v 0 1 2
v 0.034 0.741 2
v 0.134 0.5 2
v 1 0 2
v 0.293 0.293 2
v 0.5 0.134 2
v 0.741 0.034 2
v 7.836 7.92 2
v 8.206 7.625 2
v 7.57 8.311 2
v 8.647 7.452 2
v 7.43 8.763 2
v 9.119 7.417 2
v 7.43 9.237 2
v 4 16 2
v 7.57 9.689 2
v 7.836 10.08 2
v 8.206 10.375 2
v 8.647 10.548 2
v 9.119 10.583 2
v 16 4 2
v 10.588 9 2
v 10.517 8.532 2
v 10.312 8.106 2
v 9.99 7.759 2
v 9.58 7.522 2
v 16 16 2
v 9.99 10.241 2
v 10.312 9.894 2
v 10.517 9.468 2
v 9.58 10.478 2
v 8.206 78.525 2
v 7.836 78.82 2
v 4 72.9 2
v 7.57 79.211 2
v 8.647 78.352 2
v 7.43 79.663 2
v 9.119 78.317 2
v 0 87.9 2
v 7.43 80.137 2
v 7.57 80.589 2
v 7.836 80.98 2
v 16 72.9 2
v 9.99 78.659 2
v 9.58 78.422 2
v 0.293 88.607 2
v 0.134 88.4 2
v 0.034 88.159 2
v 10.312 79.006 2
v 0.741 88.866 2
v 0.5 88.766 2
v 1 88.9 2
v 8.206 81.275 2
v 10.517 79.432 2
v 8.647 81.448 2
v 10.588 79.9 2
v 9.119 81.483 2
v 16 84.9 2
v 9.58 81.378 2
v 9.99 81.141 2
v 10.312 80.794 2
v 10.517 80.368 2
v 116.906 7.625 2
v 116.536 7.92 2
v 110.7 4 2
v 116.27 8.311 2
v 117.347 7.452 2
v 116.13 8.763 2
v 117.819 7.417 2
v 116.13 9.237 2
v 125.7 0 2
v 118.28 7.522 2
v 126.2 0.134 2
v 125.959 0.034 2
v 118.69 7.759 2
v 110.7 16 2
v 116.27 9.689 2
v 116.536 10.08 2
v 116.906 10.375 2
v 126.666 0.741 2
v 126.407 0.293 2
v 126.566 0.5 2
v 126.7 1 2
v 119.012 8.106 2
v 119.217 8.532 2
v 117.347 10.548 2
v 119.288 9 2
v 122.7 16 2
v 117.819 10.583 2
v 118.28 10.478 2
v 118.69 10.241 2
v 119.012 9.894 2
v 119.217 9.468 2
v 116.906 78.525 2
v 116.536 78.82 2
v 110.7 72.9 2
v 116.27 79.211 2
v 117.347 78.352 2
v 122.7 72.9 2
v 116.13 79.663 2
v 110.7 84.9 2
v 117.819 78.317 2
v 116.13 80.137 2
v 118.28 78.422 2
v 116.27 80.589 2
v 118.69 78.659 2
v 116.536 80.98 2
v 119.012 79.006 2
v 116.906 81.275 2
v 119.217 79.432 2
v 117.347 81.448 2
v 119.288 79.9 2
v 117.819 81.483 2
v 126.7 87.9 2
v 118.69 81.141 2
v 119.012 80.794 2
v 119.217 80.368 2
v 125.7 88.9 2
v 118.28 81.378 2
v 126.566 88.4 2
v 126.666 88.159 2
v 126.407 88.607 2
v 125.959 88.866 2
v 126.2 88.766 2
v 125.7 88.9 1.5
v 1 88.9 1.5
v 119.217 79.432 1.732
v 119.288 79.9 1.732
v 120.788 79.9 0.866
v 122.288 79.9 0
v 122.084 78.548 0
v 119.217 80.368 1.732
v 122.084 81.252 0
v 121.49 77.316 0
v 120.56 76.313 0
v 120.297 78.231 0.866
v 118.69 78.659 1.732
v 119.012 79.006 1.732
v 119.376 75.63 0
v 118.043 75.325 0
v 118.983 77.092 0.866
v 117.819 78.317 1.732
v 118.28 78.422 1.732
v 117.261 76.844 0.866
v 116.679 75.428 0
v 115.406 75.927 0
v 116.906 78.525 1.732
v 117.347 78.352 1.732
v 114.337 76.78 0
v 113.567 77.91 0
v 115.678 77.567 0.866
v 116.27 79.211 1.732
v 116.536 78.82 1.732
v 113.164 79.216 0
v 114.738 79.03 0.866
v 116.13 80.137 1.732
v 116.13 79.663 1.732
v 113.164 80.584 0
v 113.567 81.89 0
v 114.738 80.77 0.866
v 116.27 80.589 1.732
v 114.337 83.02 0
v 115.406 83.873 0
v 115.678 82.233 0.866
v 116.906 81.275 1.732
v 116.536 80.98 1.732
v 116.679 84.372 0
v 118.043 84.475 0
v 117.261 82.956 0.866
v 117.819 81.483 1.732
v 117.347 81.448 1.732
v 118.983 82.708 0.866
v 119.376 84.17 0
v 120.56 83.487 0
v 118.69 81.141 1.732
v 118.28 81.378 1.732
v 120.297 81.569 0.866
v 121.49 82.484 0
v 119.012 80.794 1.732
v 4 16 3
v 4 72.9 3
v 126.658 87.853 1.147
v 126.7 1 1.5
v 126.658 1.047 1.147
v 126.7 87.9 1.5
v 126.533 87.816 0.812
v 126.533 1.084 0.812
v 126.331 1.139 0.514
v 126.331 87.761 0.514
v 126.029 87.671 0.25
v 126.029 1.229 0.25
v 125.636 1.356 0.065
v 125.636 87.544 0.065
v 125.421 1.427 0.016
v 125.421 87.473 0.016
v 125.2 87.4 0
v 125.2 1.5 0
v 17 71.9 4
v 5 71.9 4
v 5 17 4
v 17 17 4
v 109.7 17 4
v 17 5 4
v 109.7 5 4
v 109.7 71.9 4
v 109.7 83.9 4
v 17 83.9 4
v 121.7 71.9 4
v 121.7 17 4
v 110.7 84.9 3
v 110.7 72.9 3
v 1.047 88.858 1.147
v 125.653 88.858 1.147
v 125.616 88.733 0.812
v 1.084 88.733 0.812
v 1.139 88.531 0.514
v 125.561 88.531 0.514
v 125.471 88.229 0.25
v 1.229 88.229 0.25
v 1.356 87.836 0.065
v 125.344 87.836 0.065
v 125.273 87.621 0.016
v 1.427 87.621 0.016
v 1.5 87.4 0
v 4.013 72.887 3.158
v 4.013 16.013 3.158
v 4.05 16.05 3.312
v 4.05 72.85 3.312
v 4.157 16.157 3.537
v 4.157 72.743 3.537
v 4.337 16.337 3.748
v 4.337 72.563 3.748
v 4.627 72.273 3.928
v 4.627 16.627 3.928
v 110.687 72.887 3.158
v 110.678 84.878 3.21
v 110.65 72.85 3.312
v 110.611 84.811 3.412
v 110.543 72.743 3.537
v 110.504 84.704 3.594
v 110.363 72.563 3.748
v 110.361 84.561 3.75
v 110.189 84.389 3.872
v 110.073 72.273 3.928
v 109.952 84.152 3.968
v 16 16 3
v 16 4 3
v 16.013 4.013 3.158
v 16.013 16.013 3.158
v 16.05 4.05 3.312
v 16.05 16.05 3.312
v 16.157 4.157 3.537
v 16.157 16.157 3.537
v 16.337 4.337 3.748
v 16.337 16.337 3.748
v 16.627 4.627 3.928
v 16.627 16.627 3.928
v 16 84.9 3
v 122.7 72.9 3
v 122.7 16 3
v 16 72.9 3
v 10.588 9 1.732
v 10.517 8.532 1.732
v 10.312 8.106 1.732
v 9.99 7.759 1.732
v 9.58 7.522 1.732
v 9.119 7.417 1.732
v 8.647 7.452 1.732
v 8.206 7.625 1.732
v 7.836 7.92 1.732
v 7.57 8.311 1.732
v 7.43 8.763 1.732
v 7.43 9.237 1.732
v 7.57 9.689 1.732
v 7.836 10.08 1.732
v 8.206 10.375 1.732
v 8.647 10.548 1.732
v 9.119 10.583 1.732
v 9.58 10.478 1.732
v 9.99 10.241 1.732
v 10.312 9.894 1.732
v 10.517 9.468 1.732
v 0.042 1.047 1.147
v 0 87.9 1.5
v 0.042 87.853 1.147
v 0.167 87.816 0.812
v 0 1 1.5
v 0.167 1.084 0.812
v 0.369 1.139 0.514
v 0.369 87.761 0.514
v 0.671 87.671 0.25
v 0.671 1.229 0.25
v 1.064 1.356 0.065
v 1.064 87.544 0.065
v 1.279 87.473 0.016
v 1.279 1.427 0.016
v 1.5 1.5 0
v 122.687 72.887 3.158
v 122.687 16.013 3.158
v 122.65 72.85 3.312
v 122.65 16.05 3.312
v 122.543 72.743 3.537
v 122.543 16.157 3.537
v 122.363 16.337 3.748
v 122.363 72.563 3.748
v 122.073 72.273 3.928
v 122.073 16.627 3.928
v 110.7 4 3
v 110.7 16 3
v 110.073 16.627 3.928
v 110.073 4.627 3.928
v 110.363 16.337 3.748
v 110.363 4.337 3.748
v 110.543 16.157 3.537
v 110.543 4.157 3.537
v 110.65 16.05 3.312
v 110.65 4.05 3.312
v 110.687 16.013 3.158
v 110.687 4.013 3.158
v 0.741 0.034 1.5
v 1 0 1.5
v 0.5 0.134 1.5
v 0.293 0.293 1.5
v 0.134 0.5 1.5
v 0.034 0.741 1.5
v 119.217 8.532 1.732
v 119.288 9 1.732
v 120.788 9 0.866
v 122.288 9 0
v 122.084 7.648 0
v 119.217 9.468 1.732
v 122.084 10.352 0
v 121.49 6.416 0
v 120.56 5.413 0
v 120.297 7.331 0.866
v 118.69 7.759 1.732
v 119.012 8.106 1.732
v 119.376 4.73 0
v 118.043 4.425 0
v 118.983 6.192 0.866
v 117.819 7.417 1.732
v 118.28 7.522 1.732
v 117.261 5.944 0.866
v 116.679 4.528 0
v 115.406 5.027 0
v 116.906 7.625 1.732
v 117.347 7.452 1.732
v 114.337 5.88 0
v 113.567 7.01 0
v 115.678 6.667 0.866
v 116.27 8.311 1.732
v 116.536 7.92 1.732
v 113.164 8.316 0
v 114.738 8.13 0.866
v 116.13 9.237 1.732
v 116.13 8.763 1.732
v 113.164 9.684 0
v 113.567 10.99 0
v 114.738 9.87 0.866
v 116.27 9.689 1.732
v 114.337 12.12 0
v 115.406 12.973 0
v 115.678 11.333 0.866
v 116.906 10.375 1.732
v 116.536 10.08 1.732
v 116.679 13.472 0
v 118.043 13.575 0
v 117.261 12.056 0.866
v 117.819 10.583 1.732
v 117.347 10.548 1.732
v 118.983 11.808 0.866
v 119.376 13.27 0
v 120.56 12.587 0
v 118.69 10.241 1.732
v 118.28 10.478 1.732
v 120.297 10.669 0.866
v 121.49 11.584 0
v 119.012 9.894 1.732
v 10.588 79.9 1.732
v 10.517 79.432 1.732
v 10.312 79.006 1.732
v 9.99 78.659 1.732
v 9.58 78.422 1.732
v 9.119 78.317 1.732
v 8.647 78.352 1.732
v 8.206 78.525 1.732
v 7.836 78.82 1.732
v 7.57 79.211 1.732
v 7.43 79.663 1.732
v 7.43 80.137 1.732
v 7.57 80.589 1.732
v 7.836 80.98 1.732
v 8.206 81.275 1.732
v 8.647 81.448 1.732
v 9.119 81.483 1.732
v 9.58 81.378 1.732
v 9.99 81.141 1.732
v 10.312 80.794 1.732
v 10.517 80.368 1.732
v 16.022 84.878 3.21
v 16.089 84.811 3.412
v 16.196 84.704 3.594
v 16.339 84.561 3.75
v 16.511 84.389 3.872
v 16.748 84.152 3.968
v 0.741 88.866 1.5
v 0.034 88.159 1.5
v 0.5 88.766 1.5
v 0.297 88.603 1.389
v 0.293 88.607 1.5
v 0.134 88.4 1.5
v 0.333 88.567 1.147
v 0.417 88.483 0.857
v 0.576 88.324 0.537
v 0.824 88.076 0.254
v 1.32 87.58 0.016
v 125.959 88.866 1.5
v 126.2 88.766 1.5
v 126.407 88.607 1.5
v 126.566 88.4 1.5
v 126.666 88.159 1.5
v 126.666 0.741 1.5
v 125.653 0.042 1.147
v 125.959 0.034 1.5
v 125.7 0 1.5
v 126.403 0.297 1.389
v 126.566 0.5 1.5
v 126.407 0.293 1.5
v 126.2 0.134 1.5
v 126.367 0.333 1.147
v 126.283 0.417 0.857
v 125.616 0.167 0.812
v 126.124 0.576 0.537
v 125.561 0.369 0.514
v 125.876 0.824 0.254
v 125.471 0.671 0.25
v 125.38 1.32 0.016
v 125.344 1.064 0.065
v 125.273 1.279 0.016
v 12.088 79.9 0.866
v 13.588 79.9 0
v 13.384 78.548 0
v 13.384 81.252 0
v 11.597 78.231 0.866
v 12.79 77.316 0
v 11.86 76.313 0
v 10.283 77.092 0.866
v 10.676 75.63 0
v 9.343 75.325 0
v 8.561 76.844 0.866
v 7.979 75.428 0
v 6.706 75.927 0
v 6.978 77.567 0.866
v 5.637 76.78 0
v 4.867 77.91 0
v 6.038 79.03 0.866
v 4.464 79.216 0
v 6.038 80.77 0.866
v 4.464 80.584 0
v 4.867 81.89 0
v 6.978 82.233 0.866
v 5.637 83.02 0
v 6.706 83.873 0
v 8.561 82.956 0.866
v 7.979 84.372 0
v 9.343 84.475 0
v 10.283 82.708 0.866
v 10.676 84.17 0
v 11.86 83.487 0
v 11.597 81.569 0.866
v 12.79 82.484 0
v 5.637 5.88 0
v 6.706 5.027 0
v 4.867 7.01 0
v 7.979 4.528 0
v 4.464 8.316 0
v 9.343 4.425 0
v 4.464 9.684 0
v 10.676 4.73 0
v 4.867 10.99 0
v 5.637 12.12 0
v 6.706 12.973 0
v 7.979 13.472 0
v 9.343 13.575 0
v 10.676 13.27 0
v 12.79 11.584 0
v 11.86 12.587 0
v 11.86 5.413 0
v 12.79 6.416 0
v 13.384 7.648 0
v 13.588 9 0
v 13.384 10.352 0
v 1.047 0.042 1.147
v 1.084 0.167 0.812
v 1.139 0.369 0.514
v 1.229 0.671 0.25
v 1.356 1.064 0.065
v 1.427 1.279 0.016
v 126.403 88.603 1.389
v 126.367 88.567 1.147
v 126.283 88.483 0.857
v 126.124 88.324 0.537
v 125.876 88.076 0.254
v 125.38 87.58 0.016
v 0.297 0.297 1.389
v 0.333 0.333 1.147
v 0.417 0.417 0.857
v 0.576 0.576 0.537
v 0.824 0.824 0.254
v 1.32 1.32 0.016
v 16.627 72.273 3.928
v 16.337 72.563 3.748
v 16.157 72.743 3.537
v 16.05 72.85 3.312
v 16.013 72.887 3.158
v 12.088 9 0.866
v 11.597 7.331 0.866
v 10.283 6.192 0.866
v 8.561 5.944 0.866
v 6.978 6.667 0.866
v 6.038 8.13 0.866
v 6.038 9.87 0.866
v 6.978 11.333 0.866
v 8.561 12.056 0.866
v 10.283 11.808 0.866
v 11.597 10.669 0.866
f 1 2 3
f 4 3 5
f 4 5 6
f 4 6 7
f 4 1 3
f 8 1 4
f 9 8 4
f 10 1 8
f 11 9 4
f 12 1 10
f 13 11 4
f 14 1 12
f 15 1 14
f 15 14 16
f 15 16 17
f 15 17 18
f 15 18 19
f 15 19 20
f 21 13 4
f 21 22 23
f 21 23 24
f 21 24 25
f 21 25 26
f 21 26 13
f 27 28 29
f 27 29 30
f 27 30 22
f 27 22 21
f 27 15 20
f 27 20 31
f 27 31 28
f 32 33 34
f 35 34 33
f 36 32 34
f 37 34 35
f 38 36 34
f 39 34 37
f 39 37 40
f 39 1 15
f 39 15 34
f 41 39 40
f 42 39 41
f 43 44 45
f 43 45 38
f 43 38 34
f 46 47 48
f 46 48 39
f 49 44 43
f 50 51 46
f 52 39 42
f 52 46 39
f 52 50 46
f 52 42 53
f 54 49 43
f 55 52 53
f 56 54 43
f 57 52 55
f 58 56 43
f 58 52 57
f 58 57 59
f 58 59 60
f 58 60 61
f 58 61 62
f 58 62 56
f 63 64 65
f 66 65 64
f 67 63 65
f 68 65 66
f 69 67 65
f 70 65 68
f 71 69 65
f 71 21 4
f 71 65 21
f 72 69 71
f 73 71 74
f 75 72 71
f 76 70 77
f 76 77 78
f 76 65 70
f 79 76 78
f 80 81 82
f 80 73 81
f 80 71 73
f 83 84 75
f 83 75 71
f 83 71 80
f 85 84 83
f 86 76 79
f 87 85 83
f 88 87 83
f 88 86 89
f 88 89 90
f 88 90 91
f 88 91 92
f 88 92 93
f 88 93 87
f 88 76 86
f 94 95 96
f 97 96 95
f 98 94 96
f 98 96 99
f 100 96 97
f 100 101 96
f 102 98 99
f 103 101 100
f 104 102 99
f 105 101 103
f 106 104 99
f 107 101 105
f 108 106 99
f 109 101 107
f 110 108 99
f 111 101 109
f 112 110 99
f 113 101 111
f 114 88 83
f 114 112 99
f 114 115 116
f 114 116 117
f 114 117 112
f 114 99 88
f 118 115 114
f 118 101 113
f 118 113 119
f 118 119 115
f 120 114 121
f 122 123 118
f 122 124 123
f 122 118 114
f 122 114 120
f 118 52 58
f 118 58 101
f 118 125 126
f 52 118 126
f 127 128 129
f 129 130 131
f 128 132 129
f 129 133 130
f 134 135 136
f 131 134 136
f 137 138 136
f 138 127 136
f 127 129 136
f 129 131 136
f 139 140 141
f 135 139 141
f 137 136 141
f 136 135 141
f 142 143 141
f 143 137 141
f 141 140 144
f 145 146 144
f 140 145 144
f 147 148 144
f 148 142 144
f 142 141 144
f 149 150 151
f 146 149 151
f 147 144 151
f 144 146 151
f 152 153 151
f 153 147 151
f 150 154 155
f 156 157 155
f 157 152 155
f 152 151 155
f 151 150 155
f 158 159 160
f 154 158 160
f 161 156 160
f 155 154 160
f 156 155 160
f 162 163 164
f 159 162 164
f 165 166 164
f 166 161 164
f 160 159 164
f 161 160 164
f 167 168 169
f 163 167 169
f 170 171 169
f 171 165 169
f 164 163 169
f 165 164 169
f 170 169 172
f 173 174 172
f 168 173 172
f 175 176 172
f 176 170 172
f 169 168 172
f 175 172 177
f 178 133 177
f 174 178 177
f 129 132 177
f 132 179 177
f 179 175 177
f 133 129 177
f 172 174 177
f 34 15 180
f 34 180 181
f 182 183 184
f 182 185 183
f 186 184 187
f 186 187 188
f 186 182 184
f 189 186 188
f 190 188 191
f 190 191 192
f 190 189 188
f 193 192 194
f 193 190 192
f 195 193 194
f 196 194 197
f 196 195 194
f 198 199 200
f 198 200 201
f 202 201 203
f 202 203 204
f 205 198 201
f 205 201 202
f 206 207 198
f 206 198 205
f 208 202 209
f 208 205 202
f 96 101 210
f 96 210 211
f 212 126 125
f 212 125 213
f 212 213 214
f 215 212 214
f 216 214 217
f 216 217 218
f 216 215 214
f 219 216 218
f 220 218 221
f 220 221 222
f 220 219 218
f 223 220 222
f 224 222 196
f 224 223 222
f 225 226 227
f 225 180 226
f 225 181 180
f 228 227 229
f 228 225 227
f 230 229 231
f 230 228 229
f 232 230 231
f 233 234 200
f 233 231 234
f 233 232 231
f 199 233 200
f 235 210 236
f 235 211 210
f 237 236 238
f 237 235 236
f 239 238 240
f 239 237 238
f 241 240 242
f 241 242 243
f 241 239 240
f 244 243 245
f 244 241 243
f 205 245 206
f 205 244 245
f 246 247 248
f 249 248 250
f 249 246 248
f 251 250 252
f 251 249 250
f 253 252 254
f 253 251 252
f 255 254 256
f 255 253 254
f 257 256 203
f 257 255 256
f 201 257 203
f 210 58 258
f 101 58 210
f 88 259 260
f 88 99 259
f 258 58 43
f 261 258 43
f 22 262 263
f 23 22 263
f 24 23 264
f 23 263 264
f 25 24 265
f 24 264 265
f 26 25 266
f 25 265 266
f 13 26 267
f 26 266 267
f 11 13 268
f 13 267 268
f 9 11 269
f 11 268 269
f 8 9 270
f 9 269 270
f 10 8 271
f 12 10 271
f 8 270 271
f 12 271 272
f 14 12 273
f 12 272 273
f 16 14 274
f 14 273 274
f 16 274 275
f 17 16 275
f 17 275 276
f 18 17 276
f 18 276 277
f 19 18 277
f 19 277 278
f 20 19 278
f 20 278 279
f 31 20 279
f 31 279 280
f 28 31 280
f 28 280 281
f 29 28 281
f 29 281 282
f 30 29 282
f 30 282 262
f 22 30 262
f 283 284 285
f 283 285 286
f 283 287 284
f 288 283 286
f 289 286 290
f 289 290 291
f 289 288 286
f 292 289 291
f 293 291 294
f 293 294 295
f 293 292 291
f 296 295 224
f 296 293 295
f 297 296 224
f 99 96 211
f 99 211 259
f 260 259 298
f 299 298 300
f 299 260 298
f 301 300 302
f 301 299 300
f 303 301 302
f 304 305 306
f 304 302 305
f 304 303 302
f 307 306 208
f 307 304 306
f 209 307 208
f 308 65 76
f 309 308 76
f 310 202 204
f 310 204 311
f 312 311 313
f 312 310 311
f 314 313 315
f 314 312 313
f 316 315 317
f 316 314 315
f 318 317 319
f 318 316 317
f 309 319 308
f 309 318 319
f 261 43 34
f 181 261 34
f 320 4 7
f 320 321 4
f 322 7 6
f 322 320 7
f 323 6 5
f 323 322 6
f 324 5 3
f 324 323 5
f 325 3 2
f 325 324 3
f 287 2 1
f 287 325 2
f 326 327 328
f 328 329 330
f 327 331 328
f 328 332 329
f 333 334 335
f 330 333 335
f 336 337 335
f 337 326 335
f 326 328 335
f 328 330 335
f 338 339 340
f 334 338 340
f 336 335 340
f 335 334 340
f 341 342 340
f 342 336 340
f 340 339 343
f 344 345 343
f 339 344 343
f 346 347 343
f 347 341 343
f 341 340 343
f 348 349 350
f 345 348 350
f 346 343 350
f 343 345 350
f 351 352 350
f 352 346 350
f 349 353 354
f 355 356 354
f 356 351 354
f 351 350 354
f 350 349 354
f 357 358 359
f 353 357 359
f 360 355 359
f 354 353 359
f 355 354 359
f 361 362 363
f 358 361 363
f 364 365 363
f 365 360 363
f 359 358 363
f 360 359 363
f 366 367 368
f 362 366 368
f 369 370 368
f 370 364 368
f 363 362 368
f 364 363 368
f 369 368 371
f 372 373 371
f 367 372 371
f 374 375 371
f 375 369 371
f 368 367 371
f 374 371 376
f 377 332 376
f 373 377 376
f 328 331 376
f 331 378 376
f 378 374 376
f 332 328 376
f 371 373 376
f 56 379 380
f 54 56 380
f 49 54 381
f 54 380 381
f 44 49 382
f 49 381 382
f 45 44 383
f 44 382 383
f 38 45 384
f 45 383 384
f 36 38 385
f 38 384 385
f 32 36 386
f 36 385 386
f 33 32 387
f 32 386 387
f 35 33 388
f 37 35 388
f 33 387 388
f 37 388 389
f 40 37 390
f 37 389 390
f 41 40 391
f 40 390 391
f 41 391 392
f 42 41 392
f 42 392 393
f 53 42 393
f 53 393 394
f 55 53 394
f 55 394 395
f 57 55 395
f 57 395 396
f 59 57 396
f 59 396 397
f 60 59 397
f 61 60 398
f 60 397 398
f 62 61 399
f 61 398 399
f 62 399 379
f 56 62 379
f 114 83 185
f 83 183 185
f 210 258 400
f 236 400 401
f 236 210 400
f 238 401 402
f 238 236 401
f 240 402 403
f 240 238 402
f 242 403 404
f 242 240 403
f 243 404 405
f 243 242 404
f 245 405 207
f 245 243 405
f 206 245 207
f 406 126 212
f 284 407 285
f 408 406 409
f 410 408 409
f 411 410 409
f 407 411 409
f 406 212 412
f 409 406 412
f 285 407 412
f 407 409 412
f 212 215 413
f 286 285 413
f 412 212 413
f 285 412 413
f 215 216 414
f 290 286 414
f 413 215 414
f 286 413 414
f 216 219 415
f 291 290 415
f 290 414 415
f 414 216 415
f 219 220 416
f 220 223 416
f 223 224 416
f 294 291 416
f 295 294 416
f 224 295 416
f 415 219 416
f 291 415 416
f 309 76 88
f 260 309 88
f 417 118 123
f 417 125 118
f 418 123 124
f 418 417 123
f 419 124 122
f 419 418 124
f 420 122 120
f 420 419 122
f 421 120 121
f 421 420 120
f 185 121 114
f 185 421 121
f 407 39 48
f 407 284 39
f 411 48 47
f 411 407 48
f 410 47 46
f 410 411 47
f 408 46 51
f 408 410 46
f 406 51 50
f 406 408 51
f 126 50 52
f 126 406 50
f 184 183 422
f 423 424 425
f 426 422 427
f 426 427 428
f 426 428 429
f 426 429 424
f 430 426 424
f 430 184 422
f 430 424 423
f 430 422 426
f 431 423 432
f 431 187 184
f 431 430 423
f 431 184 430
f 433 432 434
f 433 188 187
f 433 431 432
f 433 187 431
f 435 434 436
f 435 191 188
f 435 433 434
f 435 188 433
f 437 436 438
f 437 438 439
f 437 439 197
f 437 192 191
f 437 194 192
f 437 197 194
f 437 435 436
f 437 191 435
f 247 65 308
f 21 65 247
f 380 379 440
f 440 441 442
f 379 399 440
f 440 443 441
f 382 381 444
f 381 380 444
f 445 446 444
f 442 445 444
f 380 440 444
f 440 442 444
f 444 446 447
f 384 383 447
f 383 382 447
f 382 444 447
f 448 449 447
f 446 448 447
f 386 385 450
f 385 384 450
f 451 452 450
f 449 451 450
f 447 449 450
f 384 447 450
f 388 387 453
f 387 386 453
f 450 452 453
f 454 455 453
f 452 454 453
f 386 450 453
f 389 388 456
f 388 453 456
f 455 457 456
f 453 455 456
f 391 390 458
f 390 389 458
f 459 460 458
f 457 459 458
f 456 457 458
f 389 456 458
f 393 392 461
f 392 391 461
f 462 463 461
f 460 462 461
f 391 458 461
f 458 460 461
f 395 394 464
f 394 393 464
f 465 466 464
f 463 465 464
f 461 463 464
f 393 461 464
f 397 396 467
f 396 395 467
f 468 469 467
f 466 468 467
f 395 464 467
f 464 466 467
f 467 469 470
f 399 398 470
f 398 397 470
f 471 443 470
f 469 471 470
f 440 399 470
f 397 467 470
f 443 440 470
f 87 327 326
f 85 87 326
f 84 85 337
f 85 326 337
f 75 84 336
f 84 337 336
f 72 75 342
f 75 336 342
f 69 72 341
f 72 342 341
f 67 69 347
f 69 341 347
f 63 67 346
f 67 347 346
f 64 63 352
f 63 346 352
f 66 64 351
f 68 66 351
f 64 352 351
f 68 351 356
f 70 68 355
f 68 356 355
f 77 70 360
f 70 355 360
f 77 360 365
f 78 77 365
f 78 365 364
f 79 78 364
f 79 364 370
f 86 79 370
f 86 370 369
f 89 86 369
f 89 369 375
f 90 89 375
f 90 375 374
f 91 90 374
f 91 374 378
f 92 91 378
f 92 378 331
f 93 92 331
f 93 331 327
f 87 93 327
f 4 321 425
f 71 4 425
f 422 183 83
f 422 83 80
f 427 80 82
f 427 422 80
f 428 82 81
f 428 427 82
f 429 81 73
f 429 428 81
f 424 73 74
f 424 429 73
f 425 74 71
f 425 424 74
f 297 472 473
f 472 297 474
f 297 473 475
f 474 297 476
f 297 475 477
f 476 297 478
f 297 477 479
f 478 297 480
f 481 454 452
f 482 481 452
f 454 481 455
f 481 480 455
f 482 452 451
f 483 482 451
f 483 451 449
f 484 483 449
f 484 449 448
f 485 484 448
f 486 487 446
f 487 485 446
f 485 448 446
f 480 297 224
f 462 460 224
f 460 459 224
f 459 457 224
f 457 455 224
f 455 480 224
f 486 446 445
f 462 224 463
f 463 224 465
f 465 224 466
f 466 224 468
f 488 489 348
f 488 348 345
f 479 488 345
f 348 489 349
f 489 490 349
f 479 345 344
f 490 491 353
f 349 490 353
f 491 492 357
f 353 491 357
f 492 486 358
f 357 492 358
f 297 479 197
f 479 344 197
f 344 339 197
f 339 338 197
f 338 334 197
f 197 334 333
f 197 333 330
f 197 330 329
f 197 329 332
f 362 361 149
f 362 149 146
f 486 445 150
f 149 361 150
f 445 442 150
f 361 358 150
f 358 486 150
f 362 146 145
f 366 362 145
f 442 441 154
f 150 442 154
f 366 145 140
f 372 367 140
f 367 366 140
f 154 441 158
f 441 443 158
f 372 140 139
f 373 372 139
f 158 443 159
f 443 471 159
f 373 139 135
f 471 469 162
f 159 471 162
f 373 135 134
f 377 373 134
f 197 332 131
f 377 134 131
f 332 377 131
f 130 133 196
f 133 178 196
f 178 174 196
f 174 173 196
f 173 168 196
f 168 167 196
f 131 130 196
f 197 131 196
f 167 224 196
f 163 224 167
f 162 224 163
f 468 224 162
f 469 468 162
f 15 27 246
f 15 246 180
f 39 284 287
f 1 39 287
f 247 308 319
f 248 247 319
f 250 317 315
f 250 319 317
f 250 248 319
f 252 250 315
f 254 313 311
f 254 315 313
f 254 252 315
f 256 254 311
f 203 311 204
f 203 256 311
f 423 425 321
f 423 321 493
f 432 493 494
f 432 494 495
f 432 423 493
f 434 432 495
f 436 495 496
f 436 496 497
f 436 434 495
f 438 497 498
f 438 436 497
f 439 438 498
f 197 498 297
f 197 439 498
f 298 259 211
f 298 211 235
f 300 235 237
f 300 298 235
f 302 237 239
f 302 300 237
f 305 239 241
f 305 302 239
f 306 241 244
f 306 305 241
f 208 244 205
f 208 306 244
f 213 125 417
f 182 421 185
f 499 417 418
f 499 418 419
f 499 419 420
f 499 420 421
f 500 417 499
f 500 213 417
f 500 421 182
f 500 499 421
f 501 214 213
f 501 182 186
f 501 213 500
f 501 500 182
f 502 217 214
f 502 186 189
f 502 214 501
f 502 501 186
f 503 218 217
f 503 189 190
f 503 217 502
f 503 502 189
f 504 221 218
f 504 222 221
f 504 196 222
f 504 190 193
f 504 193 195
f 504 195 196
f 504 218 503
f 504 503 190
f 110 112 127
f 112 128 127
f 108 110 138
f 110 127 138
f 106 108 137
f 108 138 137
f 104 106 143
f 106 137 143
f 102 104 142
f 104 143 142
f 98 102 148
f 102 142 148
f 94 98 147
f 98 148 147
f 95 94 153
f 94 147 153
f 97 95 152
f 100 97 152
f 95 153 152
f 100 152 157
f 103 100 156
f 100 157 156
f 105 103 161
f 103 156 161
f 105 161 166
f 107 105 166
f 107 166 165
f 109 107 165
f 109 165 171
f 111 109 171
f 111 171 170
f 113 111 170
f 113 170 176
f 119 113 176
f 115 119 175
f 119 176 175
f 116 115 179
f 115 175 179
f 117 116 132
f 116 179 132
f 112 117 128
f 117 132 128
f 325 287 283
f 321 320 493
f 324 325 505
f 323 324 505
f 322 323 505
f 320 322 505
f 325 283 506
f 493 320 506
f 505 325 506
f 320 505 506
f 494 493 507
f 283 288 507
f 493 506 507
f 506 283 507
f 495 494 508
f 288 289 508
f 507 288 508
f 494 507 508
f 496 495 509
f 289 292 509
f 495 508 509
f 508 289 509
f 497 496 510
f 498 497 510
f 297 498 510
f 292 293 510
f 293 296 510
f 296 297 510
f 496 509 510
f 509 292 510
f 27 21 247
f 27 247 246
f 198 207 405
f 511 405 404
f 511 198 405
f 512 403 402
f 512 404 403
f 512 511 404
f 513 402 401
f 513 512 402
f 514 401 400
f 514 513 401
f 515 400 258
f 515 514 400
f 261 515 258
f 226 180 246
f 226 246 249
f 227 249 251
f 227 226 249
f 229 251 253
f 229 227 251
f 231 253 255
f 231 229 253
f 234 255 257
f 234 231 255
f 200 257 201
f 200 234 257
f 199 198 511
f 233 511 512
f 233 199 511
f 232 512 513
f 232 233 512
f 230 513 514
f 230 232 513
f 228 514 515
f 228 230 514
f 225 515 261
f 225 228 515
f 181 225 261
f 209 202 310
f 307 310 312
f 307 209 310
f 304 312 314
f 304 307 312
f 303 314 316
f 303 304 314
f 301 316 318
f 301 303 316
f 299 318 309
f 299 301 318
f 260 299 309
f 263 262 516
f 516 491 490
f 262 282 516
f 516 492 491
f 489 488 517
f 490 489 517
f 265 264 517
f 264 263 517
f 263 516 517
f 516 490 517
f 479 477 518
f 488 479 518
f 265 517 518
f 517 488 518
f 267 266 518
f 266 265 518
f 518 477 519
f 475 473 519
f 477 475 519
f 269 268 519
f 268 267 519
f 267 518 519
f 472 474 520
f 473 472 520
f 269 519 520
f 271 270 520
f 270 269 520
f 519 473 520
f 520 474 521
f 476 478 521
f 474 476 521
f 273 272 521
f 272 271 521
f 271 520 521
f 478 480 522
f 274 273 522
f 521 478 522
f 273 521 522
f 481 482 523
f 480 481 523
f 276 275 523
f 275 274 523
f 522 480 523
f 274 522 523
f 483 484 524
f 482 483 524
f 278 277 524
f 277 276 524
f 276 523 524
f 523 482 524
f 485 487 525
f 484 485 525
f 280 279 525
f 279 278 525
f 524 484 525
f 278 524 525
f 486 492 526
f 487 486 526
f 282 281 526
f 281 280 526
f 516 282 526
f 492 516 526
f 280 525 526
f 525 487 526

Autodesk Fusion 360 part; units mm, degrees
sketch "Sketch1" plane through (0, 0, 0) normal (0, 0, 1) x (1, 0, 0)
  line L0 (0, 0) -> (126.7, 0)
  line L1 (126.7, 0) -> (126.7, 88.9)
  line L2 (126.7, 88.9) -> (0, 88.9)
  line L3 (0, 88.9) -> (0, 0)
  line L4 (0, 44.45) -> (126.7, 44.45) construction
  line L5 (63.35, 88.9) -> (63.35, 0) construction
  line L6 (4, 84.9) -> (122.7, 84.9)
  line L7 (122.7, 84.9) -> (122.7, 4)
  line L8 (122.7, 4) -> (4, 4)
  line L9 (4, 4) -> (4, 84.9)
  line L10 (4, 84.9) -> (122.7, 4) construction
  line L11 (122.7, 84.9) -> (4, 4) construction
  line L12 (4, 84.9) -> (16, 84.9)
  line L13 (16, 84.9) -> (16, 72.9)
  line L14 (16, 72.9) -> (4, 72.9)
  line L15 (4, 72.9) -> (4, 84.9)
  line L16 (4, 4) -> (16, 4)
  line L17 (16, 4) -> (16, 16)
  line L18 (16, 16) -> (4, 16)
  line L19 (4, 16) -> (4, 4)
  line L20 (122.7, 4) -> (110.7, 4)
  line L21 (110.7, 4) -> (110.7, 16)
  line L22 (110.7, 16) -> (122.7, 16)
  line L23 (122.7, 16) -> (122.7, 4)
  line L24 (122.7, 84.9) -> (110.7, 84.9)
  line L25 (110.7, 84.9) -> (110.7, 72.9)
  line L26 (110.7, 72.9) -> (122.7, 72.9)
  line L27 (122.7, 72.9) -> (122.7, 84.9)
  point P0 (63.35, 44.45)
  dimension "d179" = 126.7
  dimension "d180" = 88.9
  dimension "d181" = 118.7
  dimension "d182" = 80.9
  dimension "d183" = 12
  dimension "d184" = 12
  dimension "d185" = 12
  dimension "d186" = 12
  dimension "d187" = 12
  dimension "d188" = 12
  dimension "d189" = 12
  dimension "d190" = 12
  dimension "d209" = 0
  dimension "d210" = 0
  dimension "d211" = 0
  dimension "d212" = 0
extrude "Extrude1" add sketch "Sketch1" along normal blind 4 contours L6 L7 L8 L9 L13 L14 L17 L18 L21 L22 L25 L26
extrude "Extrude2" add sketch "Sketch1" along normal blind 2 contours L0 L1 L2 L3 | L6 L9 L12 L13 L14 L15 | L6 L7 L24 L25 L26 L27 | L8 L9 L16 L17 L18 L19 | L7 L8 L20 L21 L22 L23
sketch "Sketch2" plane through (0, 0, 0) normal (0, 0, 1) x (1, 0, 0)
  line L0 (126.7, 88.9) -> (0, 88.9)
  line L1 (0, 0) -> (126.7, 0)
  line L2 (117.7, 88.9) -> (117.7, 0) construction
  line L3 (9, 0) -> (9, 88.9) construction
  line L4 (0, 88.9) -> (0, 0)
  line L5 (126.7, 0) -> (126.7, 88.9)
  line L6 (0, 79.9) -> (126.7, 79.9) construction
  line L7 (0, 9) -> (126.7, 9) construction
  line L8 (0, 88.9) -> (0, 0)
  circle A0 centre (9, 9) radius 1.5875
  circle A1 centre (117.7, 9) radius 1.5875
  circle A2 centre (117.7, 79.9) radius 1.5875
  circle A3 centre (9, 79.9) radius 1.5875
  dimension "d195" = 9
  dimension "d196" = 9
  dimension "d197" = 9
  dimension "d198" = 9
  dimension "d199" = 3.175
  dimension "d200" = 3.175
  dimension "d201" = 3.175
  dimension "d202" = 3.175
extrude "Extrude3" cut sketch "Sketch2" along normal blind 10 contours A0 | A1 | A2 | A3
fillet "Fillet1" radius 1 12 edges at (63.35, 84.9, 4) (16, 78.9, 4) (10, 72.9, 4) (4, 44.45, 4) (10, 16, 4) (16, 10, 4) (63.35, 4, 4) (110.7, 10, 4) (116.7, 16, 4) (122.7, 44.45, 4) (116.7, 72.9, 4) (110.7, 78.9, 4)
fillet "Fillet2" radius 1.5 4 edges at (63.35, 88.9, 0) (0, 44.45, 0) (63.35, 0, 0) (126.7, 44.45, 0)
chamfer "Chamfer1" distance 3 angle 30 4 edges at (7.5199, 79.3259, 0) (7.5199, 8.4259, 0) (116.2199, 8.4259, 0) (116.2199, 79.3259, 0) measured on face at (81.0168, 32.9119, 0) measured on face at (81.0168, 32.9119, 0) measured on face at (81.0168, 32.9119, 0) measured on face at (81.0168, 32.9119, 0)
fillet "Fillet3" radius 1 8 edges at (0.4393, 0.4393, 0.4393) (0, 0, 1.75) (0.4393, 88.4607, 0.4393) (0, 88.9, 1.75) (126.2607, 88.4607, 0.4393) (126.7, 88.9, 1.75) (126.2607, 0.4393, 0.4393) (126.7, 0, 1.75)
equation "d181 = 126.7 mm - 8 mm"
equation "d182 = 88.9 mm - 8 mm"
equation "d199 = ( 0.125 * 25.4 ) * 1 mm"
